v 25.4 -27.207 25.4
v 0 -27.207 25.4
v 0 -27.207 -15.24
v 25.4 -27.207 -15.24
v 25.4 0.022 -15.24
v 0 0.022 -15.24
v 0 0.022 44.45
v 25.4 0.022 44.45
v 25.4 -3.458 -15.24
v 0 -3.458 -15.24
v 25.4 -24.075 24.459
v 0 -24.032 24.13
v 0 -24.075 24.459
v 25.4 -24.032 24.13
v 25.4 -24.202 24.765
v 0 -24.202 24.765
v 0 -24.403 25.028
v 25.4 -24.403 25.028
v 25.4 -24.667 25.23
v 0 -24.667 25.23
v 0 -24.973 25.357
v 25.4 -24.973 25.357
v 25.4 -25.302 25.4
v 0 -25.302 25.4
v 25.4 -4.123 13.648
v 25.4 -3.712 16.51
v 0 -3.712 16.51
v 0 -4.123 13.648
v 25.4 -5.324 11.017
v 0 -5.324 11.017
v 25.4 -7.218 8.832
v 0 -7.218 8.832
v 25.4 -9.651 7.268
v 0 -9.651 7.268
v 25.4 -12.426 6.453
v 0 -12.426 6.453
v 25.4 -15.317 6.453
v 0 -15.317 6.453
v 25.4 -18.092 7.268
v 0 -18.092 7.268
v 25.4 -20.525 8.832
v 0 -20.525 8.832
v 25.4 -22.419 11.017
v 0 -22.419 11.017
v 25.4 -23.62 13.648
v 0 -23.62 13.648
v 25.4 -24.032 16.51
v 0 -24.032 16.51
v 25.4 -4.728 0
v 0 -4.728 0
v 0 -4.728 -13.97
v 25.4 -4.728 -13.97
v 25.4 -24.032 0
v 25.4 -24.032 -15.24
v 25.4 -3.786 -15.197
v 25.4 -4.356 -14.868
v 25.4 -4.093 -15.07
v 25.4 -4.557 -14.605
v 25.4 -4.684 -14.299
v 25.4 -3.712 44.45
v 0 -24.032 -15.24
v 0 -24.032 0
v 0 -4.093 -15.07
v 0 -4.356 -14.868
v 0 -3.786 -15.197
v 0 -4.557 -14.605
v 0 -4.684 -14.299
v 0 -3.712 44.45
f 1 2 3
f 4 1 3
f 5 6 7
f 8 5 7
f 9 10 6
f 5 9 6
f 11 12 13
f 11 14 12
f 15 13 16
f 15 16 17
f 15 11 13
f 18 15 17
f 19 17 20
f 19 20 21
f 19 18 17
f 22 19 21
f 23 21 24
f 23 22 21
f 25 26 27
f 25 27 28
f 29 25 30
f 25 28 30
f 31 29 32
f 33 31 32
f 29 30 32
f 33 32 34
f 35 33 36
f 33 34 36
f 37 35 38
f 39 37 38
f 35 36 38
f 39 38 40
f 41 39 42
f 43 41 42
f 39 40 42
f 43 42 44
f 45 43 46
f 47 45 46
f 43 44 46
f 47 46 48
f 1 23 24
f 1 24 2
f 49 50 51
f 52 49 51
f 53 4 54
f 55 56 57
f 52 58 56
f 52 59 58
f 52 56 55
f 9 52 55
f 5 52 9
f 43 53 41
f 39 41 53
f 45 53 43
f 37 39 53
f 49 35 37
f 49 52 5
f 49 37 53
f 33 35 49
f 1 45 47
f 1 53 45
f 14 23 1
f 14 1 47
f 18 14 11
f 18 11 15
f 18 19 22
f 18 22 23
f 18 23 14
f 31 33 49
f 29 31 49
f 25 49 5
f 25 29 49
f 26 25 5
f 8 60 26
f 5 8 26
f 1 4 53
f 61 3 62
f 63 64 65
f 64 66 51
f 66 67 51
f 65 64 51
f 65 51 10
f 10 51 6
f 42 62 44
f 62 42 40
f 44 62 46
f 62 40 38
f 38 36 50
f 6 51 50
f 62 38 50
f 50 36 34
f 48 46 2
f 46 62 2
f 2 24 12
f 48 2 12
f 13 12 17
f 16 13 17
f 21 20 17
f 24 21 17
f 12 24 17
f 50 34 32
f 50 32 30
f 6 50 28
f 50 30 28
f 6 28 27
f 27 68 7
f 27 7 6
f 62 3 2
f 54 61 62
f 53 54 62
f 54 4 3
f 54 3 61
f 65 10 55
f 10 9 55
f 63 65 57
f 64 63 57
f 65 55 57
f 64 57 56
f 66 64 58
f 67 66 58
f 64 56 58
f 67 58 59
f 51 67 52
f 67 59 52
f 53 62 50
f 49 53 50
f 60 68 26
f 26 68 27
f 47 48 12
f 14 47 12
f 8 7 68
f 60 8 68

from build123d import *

# Parameters (mm, degrees)
F1_DEPTH = 25.4
F2_R     = 1.27
F3_R     = 1.27


with BuildPart() as f1:
    # F0 (on Right) → F1 (new body)
    with BuildSketch(Plane.YZ):
        with BuildLine():
            Line((-24.031516, -15.24), (-24.031516, 0))
            Line((-24.031516, 0), (-4.727516, 0))
            Line((-4.727516, 0), (-4.727516, -15.24))
            Line((-4.727516, -15.24), (0.022284, -15.24))
            Line((0.022284, -15.24), (0.022284, 44.45))
            Line((0.022284, 44.45), (-3.711516, 44.45))
            Line((-3.711516, 44.45), (-3.711516, 16.51))
            ThreePointArc((-3.711516, 16.51), (-13.871516, 6.35), (-24.031516, 16.51))
            Line((-24.031516, 16.51), (-24.031516, 25.4))
            Line((-24.031516, 25.4), (-27.206516, 25.4))
            Line((-27.206516, 25.4), (-27.206516, -15.24))
            Line((-27.206516, -15.24), (-26.082276, -15.24))
            Line((-26.082276, -15.24), (-24.031516, -15.24))
        make_face()
    extrude(amount=F1_DEPTH)

    # F2
    f2_edges = [f1.edges().sort_by_distance(p)[0] for p in [
        (12.7, -24.031516, 25.4),
    ]]
    fillet(f2_edges, radius=F2_R)

    # F3
    f3_edges = [f1.edges().sort_by_distance(p)[0] for p in [
        (12.7, -4.727516, -15.24),
    ]]
    fillet(f3_edges, radius=F3_R)


solid = f1.part
